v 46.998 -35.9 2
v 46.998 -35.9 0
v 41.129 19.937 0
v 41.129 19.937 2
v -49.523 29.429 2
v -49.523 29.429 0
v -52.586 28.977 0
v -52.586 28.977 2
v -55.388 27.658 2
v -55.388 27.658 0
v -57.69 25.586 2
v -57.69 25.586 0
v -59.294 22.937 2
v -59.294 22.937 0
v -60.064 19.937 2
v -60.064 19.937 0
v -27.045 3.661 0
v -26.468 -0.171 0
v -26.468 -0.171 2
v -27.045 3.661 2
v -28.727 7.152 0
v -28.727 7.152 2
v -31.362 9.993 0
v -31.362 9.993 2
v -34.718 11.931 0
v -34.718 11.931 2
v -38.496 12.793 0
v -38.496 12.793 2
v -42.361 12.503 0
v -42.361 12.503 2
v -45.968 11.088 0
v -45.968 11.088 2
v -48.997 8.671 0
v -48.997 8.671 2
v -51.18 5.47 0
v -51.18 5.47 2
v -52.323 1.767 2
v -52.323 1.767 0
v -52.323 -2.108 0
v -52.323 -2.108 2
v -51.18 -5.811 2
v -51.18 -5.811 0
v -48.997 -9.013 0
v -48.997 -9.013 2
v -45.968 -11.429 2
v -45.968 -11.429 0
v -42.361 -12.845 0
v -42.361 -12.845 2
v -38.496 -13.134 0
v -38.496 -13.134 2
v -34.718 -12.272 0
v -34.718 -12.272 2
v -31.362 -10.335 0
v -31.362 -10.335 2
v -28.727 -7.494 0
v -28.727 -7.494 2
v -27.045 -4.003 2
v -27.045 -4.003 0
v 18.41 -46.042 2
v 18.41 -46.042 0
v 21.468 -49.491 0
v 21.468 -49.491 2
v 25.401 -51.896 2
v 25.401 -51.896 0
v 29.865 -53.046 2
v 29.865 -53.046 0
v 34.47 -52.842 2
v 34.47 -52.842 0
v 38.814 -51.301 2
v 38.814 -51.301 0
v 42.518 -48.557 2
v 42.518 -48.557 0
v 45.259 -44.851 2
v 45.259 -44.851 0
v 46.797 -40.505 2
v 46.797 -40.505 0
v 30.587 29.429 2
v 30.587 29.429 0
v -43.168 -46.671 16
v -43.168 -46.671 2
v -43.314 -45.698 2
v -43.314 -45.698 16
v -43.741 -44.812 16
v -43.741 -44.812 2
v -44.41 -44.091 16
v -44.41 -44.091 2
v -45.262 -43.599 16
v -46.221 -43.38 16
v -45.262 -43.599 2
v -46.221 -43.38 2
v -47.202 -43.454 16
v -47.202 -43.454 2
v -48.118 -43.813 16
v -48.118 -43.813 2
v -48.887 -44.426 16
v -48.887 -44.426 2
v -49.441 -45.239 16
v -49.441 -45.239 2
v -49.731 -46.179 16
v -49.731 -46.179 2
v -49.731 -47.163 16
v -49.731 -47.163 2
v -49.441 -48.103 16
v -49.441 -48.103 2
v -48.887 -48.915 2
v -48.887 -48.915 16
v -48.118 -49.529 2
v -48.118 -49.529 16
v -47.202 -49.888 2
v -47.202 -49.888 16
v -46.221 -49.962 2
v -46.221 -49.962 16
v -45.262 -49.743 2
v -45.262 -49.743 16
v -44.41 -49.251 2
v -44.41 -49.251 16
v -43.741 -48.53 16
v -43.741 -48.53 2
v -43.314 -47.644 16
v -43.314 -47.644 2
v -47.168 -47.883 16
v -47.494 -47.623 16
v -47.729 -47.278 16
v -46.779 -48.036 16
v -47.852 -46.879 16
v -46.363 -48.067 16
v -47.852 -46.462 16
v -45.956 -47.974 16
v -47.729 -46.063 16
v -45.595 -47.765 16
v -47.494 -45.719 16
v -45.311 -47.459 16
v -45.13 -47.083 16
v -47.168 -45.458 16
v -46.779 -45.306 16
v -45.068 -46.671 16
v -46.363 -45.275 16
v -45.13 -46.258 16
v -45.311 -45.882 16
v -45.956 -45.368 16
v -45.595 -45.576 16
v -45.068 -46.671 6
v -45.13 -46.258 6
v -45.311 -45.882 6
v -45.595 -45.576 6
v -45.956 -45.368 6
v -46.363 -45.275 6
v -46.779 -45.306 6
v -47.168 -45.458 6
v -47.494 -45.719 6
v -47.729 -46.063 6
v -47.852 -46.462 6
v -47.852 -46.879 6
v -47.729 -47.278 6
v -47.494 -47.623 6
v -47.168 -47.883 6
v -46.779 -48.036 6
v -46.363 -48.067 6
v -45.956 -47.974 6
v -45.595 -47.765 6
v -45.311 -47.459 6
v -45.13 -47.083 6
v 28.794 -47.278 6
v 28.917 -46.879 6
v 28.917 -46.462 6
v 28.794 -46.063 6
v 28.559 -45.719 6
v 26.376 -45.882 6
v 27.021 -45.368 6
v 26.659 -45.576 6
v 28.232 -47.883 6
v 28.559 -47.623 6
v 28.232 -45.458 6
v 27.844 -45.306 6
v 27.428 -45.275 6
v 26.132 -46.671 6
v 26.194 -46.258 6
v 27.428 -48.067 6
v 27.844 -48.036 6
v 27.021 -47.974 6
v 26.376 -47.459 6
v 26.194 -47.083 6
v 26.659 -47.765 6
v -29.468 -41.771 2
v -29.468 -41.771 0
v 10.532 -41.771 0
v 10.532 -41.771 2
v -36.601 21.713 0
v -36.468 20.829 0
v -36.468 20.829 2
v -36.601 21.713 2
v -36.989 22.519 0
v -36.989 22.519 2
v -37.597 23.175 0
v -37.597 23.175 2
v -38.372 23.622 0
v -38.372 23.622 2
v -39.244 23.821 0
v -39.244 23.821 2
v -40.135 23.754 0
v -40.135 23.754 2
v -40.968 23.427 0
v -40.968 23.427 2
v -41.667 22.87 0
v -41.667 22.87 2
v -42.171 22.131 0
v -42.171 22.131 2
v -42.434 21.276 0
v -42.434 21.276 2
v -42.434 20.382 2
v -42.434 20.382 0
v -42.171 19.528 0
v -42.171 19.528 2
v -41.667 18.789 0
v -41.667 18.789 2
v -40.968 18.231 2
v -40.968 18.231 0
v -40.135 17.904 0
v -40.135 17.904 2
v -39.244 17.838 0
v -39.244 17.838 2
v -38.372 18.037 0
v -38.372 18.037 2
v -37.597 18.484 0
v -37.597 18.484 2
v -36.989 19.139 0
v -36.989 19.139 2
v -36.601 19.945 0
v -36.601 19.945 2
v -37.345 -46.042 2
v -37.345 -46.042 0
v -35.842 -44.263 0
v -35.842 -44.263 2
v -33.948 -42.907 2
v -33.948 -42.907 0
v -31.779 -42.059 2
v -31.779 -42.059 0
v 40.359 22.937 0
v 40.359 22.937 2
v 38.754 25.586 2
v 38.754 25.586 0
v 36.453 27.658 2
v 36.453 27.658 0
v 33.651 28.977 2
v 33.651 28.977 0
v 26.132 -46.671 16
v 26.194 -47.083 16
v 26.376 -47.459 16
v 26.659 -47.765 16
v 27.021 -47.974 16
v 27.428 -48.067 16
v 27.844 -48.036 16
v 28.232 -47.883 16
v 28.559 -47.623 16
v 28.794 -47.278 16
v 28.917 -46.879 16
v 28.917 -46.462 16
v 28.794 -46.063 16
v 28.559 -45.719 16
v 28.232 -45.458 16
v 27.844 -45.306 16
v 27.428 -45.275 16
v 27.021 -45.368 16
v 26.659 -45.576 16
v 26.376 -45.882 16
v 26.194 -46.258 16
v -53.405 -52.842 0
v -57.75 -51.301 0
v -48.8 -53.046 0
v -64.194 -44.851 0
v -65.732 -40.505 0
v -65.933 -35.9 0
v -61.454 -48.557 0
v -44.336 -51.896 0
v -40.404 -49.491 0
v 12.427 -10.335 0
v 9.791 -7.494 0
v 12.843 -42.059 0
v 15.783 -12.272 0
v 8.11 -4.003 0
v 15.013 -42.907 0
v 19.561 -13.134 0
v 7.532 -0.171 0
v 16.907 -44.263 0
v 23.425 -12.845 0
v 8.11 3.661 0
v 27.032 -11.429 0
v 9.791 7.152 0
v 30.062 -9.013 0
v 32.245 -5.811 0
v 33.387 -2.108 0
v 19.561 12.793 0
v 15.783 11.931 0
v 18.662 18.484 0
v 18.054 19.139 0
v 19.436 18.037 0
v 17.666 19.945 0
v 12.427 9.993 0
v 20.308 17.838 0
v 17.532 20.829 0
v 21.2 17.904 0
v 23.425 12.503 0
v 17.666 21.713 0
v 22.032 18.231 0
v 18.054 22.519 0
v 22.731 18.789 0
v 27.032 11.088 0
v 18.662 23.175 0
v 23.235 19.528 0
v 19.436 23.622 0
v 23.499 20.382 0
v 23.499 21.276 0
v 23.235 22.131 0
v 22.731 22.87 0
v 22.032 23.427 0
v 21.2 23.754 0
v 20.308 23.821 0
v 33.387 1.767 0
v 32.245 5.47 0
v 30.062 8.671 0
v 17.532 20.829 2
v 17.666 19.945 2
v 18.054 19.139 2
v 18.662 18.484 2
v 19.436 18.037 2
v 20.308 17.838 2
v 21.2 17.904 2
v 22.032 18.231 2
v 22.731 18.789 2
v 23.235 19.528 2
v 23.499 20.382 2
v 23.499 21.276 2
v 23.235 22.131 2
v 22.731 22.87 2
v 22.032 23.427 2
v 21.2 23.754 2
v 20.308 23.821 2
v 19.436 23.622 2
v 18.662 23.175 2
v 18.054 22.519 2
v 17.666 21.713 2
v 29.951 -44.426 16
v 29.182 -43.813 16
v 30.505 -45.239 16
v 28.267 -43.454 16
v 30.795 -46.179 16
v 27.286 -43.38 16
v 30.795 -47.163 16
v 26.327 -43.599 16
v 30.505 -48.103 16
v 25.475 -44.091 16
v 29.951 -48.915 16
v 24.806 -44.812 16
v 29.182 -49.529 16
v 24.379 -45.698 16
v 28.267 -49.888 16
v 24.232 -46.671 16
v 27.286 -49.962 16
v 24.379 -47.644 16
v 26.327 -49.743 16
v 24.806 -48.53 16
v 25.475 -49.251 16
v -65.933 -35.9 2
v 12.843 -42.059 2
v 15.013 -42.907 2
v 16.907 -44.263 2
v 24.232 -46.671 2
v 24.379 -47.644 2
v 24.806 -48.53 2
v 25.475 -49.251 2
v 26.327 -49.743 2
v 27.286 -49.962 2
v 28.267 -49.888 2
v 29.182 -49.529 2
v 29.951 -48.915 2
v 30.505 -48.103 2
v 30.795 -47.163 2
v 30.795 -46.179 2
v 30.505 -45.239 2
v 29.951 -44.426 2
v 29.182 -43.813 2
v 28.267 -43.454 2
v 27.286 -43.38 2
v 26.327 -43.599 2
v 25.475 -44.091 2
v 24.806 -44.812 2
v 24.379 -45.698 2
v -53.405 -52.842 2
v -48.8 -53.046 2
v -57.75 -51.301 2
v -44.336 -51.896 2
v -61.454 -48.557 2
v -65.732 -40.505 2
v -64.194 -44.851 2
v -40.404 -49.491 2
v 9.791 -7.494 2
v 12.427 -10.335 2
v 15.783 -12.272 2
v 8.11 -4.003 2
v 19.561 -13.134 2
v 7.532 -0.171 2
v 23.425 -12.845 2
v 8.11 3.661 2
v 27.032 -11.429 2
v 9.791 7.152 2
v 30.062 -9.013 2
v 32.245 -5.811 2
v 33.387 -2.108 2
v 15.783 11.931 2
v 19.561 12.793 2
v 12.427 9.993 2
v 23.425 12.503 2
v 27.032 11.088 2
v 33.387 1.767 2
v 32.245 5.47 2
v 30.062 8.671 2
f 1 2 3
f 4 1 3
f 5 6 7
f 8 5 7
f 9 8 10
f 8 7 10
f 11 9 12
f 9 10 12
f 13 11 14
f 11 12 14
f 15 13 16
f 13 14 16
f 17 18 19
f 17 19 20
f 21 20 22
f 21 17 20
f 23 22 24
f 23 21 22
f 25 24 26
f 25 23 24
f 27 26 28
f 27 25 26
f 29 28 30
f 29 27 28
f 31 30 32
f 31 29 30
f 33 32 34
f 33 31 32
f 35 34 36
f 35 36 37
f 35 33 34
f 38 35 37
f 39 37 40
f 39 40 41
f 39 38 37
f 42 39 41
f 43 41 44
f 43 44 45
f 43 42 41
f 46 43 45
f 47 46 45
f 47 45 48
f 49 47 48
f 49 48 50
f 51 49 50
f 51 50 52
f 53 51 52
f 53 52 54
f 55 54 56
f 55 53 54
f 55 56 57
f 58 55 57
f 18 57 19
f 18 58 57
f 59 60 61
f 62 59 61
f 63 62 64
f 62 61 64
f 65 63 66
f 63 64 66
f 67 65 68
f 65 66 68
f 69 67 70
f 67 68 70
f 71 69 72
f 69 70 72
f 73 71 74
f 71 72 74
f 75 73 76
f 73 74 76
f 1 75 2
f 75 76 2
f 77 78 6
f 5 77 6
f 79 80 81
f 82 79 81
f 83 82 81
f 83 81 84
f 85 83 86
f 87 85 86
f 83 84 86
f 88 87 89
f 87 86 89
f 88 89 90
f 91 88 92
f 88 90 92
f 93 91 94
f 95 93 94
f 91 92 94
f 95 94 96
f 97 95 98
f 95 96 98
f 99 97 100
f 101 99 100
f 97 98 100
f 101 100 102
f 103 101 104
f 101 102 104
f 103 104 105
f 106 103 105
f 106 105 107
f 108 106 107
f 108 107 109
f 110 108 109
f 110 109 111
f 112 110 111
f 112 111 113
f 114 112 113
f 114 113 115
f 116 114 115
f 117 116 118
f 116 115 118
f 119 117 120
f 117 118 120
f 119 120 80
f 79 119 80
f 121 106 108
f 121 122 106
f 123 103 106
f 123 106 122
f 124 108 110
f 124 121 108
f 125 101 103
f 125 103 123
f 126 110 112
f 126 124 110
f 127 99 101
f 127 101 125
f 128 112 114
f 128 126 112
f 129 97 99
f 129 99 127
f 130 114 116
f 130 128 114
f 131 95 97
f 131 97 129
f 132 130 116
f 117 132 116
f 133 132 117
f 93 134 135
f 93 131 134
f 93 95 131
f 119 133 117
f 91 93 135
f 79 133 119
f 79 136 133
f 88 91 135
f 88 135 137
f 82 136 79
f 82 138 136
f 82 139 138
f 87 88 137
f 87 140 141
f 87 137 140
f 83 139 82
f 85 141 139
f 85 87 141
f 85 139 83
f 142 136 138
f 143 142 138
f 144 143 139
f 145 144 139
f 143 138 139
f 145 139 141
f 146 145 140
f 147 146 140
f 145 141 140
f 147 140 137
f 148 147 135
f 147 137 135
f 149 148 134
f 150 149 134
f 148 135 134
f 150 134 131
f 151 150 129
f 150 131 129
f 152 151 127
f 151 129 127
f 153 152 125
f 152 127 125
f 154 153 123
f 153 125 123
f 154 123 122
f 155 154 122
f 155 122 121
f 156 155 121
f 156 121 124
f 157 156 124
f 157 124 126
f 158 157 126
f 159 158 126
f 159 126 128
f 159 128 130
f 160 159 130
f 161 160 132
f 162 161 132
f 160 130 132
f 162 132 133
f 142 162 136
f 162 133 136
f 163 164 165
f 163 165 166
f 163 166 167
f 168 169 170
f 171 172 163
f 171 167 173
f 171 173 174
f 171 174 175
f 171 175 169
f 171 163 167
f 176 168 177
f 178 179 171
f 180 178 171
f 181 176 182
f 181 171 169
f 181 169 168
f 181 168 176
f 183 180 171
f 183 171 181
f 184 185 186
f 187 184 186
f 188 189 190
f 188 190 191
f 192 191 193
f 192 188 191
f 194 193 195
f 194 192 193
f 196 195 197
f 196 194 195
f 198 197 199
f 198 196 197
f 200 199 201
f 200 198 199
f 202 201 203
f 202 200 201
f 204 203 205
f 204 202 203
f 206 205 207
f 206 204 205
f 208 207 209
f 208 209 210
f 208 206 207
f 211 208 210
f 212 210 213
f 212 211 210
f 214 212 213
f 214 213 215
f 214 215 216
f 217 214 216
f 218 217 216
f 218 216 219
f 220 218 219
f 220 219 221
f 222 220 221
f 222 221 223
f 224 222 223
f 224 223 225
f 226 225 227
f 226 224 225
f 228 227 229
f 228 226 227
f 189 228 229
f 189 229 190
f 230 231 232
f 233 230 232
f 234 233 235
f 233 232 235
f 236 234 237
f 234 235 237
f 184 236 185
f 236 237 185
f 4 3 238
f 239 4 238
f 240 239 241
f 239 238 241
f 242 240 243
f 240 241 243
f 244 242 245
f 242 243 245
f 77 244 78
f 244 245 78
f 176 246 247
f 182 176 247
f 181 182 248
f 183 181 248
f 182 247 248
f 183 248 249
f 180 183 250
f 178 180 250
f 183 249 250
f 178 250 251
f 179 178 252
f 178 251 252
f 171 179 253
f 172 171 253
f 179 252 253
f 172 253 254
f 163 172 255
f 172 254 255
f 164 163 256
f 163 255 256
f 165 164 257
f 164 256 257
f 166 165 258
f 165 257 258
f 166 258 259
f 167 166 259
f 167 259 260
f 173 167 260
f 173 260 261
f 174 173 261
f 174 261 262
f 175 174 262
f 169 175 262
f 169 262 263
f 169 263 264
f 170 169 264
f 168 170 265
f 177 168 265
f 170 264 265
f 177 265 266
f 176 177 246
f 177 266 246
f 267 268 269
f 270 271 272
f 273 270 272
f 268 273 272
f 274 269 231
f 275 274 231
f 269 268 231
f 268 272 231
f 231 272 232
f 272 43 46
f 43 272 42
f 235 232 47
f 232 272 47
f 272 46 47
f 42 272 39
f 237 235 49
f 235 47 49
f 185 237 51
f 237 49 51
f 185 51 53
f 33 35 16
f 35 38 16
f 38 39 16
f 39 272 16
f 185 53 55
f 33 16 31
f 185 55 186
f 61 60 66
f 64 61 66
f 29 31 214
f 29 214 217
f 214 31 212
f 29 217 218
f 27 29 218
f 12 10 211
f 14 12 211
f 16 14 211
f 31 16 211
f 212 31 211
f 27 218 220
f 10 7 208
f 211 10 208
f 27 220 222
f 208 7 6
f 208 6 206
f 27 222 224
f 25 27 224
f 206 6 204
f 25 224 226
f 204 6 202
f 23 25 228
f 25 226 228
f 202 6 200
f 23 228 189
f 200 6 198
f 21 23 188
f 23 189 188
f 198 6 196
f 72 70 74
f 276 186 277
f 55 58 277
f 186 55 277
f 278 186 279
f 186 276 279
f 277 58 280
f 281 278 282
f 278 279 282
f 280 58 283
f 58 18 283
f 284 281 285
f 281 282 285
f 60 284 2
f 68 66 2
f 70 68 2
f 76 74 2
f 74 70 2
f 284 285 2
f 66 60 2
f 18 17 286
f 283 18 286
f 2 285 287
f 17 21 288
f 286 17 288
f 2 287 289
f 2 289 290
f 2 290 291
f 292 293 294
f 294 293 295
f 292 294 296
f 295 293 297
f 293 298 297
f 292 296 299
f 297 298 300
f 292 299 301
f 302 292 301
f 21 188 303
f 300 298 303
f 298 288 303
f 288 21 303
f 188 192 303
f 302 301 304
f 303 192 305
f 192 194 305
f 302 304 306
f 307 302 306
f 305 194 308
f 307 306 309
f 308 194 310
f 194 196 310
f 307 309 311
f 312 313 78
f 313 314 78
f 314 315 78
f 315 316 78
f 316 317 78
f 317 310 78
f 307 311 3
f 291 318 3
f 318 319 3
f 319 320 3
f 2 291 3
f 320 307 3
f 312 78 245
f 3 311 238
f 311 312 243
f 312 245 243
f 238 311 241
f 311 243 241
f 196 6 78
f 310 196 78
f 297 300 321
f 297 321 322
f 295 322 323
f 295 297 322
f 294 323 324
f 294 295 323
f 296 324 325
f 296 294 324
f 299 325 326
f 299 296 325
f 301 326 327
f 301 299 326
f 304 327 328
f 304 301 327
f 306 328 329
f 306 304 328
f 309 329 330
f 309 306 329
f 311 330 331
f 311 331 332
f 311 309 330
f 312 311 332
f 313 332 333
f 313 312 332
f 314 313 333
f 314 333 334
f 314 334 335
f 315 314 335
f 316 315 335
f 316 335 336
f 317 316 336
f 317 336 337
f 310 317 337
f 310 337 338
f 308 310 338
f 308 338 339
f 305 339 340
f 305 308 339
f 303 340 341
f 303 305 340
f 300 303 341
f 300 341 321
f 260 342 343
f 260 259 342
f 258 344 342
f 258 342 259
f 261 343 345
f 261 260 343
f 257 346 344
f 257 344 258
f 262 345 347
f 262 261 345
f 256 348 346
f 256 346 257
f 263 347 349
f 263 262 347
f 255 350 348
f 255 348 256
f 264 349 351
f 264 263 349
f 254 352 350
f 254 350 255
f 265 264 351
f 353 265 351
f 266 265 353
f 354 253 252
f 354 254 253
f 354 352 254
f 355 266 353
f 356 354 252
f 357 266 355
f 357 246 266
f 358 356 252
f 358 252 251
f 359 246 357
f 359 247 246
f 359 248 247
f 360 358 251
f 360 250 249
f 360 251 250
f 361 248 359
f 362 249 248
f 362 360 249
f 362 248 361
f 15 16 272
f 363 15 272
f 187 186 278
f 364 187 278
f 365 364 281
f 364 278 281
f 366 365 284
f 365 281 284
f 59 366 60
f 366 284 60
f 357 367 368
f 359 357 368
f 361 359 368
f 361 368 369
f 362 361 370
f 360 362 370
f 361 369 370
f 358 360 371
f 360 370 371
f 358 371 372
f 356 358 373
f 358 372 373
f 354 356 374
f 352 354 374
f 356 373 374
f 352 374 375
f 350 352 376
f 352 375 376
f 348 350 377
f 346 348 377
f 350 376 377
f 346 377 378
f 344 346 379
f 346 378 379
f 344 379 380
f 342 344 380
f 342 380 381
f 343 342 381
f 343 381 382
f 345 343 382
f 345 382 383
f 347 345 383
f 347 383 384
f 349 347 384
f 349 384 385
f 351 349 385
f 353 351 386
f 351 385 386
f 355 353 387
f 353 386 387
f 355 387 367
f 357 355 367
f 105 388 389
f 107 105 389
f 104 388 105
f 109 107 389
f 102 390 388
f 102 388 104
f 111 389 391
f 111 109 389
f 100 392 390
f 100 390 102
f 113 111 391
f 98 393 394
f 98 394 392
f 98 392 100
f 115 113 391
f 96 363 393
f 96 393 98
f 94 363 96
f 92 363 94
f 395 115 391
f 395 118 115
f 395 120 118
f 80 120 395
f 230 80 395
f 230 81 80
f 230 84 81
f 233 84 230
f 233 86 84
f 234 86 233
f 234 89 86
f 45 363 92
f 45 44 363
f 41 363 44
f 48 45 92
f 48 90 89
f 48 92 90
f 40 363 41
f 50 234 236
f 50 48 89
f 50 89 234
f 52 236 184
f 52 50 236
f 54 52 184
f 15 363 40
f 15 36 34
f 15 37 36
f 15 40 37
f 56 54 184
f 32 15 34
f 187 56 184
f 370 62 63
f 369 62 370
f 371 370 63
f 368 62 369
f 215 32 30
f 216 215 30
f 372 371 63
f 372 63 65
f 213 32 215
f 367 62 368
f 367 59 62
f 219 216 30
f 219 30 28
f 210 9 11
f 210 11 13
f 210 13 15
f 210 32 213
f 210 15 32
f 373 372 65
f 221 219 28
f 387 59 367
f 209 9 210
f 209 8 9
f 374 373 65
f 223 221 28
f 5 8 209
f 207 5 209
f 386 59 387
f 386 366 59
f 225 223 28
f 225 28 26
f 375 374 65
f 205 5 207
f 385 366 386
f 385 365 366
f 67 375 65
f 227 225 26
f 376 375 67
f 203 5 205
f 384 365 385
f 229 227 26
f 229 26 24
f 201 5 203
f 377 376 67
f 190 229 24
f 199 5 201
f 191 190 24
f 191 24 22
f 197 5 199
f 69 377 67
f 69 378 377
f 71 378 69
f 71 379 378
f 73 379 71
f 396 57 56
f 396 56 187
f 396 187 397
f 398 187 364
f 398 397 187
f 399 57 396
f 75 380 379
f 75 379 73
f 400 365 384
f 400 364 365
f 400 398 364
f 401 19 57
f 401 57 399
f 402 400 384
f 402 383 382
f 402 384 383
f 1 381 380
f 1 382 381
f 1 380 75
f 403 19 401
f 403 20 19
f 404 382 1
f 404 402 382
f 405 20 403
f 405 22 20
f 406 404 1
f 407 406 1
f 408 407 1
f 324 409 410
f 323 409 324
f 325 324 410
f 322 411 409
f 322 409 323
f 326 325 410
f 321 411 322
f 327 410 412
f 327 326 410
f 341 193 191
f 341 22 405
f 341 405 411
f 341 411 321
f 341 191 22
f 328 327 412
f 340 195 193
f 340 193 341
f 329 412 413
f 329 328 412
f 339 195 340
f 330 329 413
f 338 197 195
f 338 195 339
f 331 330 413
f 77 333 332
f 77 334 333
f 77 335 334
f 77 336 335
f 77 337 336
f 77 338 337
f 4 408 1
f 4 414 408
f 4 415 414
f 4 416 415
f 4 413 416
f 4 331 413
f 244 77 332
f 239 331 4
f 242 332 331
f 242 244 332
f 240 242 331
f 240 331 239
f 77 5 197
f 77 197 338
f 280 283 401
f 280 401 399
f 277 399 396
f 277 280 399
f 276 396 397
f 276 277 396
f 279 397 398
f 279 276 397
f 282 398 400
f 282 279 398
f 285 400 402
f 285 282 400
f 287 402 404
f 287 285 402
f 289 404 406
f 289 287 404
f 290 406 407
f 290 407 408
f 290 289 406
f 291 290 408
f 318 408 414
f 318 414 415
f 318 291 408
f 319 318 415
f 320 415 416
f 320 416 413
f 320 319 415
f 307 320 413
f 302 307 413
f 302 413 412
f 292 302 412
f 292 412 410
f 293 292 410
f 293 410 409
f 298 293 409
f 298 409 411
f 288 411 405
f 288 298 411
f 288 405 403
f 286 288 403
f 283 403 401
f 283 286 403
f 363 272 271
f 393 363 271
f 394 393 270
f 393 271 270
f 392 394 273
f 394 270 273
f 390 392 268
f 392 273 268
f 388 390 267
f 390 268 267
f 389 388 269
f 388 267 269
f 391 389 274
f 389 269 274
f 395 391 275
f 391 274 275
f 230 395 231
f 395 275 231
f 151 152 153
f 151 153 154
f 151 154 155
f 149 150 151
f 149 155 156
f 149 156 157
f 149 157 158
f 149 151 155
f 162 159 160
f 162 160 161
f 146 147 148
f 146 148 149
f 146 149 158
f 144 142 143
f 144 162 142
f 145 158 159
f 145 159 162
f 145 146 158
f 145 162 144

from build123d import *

# Parameters (mm, degrees)
SKETCH1_R           = 13
SKETCH1_R_2         = 3
BOSS_EXTRUDE1_DEPTH = 2
SKETCH2_R           = 3.3
BOSS_EXTRUDE2_DEPTH = 14
SKETCH3_R           = 1.4
CUT_EXTRUDE1_DEPTH  = 10


with BuildPart() as part:
    # Sketch1 → Boss-Extrude1 (new body)
    with BuildSketch(Plane.XY):
        with BuildLine():
            Line((30.587032828, 29.429180606), (-49.522529265, 29.429180606))
            ThreePointArc((-49.522529265, 29.429180606), (-56.615313692, 26.706515756), (-60.064461355, 19.937182317))
            Line((-60.064461355, 19.937182317), (-65.933159759, -35.899753171))
            ThreePointArc((-65.933159759, -35.899753171), (-55.634580371, -52.232565016), (-37.345276376, -46.042020648))
            ThreePointArc((-37.345276376, -46.042020648), (-33.948223744, -42.907324122), (-29.467749897, -41.770819394))
            Line((-29.467749897, -41.770819394), (10.53225346, -41.770819394))
            ThreePointArc((10.53225346, -41.770819394), (15.012727307, -42.907324122), (18.409779939, -46.042020648))
            ThreePointArc((18.409779939, -46.042020648), (36.699083934, -52.232565016), (46.997663323, -35.899753171))
            Line((46.997663323, -35.899753171), (41.128964919, 19.937182317))
            ThreePointArc((41.128964919, 19.937182317), (37.679817255, 26.706515756), (30.587032828, 29.429180606))
        make_face()
        with Locations((-39.467748218, -0.170819394)):
            Circle(SKETCH1_R, mode=Mode.SUBTRACT)
        with Locations(Location((20.532251782, -0.170819394, 0), (0, 0, 180))):
            Circle(SKETCH1_R, mode=Mode.SUBTRACT)
        with Locations((-39.467748218, 20.829180606)):
            Circle(SKETCH1_R_2, mode=Mode.SUBTRACT)
        with Locations(Location((20.532251782, 20.829180606, 0), (0, 0, 180))):
            Circle(SKETCH1_R_2, mode=Mode.SUBTRACT)
    extrude(amount=BOSS_EXTRUDE1_DEPTH)

    # Sketch2 → Boss-Extrude2 (add)
    with BuildSketch(Plane.XY.offset(2)):
        with Locations((-46.467748218, -46.670819394)):
            Circle(SKETCH2_R)
        with Locations(Location((27.532251782, -46.670819394, 0), (0, 0, 180))):
            Circle(SKETCH2_R)
    extrude(amount=BOSS_EXTRUDE2_DEPTH)

    # Sketch3 → Cut-Extrude1 (cut)
    with BuildSketch(Plane.XY.offset(16)):
        with Locations((-46.467748218, -46.670819394)):
            Circle(SKETCH3_R)
        with Locations(Location((27.532251782, -46.670819394, 0), (0, 0, 180))):
            Circle(SKETCH3_R)
    extrude(amount=-CUT_EXTRUDE1_DEPTH, mode=Mode.SUBTRACT)


solid = part.part
